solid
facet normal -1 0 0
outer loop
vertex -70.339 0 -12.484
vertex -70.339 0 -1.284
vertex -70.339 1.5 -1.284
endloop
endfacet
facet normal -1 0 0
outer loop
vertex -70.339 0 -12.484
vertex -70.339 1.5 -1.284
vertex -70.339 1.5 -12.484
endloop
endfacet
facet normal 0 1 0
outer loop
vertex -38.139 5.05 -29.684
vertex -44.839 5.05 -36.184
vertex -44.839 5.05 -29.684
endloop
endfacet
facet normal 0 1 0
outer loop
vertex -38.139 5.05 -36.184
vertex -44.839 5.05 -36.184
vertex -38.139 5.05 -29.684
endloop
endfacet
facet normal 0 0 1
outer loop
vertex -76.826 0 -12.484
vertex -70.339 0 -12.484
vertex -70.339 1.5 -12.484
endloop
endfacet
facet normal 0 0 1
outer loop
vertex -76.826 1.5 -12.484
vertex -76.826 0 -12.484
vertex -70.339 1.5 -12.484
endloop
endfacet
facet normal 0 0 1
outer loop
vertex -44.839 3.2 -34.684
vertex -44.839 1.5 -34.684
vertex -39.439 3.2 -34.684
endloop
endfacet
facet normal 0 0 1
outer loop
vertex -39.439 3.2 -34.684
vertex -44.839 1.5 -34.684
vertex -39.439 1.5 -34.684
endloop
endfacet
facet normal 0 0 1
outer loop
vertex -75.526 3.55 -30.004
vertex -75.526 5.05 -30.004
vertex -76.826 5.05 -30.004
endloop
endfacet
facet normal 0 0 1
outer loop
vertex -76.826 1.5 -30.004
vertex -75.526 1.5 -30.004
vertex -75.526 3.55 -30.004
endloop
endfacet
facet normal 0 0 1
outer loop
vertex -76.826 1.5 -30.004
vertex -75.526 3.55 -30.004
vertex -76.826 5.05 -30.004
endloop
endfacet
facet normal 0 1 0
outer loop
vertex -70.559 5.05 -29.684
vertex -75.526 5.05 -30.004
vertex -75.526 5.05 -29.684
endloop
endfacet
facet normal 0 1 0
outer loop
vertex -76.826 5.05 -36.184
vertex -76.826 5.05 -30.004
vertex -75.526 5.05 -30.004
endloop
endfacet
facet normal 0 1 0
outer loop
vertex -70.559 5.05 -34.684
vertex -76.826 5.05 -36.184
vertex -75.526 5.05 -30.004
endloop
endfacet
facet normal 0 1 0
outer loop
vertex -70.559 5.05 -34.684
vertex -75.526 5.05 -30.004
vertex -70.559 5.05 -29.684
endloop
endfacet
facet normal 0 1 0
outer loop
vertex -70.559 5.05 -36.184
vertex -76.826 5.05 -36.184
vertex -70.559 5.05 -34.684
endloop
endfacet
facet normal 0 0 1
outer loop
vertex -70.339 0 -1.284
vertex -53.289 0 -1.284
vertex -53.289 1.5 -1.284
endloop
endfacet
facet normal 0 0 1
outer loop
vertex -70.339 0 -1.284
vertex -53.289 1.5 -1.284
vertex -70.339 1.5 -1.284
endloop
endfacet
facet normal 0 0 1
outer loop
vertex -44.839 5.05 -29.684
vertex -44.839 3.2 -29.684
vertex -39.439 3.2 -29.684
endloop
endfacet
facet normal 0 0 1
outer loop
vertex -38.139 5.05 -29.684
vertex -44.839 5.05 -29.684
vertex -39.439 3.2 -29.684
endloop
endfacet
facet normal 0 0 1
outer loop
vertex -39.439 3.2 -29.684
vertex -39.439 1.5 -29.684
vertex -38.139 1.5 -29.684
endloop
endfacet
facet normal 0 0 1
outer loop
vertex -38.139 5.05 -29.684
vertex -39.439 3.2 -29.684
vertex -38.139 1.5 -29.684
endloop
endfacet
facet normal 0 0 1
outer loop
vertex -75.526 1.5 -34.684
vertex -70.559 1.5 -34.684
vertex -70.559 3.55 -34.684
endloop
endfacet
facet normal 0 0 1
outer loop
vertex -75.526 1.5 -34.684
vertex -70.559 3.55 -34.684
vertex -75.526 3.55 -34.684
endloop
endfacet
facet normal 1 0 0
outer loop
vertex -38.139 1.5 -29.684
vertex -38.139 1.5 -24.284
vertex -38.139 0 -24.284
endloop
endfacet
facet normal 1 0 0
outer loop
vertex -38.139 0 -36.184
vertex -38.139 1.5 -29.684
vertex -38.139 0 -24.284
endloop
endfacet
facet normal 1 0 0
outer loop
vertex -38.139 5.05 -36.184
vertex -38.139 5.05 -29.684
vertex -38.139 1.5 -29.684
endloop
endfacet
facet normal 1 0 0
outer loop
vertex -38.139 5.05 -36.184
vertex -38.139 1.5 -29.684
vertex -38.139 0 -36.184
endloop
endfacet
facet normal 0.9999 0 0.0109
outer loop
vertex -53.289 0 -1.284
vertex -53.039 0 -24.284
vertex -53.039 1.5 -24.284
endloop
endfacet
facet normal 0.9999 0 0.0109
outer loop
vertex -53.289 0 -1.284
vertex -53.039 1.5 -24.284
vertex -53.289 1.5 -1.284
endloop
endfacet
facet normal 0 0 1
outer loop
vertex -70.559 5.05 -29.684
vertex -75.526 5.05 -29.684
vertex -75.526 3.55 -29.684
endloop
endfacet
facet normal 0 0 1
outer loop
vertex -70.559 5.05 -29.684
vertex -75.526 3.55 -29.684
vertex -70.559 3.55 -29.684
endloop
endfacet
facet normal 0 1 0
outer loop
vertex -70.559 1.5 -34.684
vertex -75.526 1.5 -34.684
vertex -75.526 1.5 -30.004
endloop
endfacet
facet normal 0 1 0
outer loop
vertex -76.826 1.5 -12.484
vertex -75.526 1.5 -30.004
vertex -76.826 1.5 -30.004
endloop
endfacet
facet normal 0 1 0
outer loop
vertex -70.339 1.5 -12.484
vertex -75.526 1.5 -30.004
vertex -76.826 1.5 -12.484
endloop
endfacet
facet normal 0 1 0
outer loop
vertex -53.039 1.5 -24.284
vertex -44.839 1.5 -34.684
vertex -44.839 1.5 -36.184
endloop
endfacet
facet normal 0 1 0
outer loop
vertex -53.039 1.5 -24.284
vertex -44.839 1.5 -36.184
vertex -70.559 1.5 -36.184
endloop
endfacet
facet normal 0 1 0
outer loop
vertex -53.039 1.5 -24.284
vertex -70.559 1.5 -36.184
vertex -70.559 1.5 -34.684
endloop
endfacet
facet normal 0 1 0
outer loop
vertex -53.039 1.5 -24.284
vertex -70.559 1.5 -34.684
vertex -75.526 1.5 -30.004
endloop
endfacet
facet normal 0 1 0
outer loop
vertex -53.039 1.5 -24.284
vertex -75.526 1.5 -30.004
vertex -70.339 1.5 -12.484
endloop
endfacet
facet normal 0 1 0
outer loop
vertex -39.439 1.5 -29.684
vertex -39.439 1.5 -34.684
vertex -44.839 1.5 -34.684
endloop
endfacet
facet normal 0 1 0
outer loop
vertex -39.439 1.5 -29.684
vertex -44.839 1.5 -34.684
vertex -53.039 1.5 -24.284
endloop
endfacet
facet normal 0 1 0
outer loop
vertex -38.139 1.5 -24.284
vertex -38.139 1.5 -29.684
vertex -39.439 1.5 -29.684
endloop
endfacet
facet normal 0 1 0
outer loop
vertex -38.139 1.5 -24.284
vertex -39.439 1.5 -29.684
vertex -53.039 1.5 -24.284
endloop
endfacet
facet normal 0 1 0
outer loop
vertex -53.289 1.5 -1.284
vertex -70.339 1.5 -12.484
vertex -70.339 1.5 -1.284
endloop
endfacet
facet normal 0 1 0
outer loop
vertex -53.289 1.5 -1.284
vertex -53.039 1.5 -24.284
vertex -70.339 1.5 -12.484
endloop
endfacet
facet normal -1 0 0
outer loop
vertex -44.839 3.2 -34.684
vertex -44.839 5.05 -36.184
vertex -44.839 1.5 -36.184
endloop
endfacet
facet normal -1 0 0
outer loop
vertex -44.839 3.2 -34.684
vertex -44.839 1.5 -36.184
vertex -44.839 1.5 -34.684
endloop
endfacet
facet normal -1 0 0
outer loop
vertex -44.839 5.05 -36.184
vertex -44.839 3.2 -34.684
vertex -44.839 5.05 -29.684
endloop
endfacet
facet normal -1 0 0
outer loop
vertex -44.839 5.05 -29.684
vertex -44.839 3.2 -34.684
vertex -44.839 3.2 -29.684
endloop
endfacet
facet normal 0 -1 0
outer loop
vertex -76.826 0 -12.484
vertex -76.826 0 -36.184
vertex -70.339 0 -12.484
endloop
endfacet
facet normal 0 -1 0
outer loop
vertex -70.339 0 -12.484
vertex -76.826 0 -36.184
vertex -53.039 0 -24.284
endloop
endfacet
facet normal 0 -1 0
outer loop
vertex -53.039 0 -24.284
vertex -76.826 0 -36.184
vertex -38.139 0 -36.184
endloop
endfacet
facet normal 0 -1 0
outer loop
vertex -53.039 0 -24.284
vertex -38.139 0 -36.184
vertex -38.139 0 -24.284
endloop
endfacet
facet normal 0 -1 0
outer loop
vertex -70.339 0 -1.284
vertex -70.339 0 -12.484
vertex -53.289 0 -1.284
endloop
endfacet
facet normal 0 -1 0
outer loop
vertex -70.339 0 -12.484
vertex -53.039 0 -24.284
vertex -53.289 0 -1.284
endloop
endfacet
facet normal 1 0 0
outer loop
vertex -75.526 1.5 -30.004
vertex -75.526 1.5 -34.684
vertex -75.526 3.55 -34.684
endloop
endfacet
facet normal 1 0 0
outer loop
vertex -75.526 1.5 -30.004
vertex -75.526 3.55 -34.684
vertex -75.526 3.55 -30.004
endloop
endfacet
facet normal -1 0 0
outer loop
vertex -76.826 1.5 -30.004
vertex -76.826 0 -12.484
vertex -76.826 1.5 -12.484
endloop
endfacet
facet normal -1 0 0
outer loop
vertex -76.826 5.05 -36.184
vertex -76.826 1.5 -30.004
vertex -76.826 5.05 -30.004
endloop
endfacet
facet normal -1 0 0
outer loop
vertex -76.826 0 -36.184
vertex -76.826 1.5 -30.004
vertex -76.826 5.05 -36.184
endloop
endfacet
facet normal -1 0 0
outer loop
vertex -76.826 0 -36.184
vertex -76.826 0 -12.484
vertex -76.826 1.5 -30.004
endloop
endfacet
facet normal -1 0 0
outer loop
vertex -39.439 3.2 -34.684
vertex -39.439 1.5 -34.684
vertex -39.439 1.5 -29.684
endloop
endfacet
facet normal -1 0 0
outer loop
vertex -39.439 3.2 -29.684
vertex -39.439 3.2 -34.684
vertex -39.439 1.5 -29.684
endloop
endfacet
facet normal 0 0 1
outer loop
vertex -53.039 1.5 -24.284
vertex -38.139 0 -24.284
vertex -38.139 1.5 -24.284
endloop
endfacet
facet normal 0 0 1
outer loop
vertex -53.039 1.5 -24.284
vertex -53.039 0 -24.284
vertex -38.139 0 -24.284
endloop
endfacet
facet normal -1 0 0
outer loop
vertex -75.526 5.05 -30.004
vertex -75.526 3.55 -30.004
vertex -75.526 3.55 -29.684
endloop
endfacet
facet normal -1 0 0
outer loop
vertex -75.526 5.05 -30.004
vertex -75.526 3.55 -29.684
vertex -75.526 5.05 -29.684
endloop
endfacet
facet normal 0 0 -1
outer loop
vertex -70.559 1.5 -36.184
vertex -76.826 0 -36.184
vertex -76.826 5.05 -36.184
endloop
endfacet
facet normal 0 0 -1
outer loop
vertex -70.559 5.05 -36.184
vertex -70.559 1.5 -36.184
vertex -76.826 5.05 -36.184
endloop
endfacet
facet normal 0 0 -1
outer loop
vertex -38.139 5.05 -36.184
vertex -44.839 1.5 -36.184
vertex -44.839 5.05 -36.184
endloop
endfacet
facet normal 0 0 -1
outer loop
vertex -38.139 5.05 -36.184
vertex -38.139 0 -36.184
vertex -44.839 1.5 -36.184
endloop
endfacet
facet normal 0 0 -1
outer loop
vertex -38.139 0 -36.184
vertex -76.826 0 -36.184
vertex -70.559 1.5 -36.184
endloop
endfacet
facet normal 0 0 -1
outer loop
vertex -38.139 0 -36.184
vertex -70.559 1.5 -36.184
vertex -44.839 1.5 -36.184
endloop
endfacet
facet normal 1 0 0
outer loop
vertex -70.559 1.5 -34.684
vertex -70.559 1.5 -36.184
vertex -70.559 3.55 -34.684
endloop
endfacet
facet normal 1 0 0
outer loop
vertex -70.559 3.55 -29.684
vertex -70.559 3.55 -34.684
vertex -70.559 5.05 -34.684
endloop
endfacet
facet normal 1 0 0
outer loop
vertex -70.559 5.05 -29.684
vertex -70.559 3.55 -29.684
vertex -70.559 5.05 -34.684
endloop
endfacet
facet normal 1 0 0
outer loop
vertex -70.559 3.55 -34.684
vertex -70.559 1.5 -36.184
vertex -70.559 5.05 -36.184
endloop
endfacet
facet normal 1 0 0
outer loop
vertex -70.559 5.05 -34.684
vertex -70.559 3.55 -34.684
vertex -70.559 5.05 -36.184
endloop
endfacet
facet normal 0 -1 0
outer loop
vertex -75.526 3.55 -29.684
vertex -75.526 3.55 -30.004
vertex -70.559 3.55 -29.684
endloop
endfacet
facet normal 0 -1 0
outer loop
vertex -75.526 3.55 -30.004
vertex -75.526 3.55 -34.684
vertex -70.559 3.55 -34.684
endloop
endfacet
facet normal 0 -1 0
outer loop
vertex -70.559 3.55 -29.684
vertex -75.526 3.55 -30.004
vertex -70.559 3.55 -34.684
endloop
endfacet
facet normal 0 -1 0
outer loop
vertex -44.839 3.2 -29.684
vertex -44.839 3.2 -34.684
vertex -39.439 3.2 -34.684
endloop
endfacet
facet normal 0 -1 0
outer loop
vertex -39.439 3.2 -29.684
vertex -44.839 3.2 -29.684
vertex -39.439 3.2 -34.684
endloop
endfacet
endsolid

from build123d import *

# Parameters (mm, degrees)
BOSS_EXTRUDE1_DEPTH = 1.5
SKETCH2_W           = 35.686807758
SKETCH2_H           = 1.5
BOSS_EXTRUDE2_DEPTH = 1.5
SKETCH3_W           = 11.9
SKETCH3_H           = 1.5
BOSS_EXTRUDE3_DEPTH = 1.5
SKETCH4_W           = 23.7
SKETCH4_H           = 1.5
BOSS_EXTRUDE4_DEPTH = 1.5
BOSS_EXTRUDE5_DEPTH = 3.55
SKETCH6_W           = 4.966668371
SKETCH6_H           = 1.5
SKETCH6_W_2         = 5.4
SKETCH6_H_2         = 1.85
BOSS_EXTRUDE6_DEPTH = 5


with BuildPart() as part:
    # Sketch1 → Boss-Extrude1 (new body)
    with BuildSketch(Plane(origin=(0, 0, 0), x_dir=(1, 0, 0), z_dir=(0, 1, 0))):
        Polygon((-75.339050621, 34.683913692), (-39.639050621, 34.683913692), (-39.639050621, 24.283913692), (-53.039050621, 24.283913692), (-53.289050621, 1.283913692), (-70.339050621, 1.283913692), (-70.339050621, 12.483913692), (-75.339050621, 12.483913692), (-75.339050621, 24.283913692), align=None)
    extrude(amount=BOSS_EXTRUDE1_DEPTH)

    # Sketch2 → Boss-Extrude2 (add)
    with BuildSketch(Plane(origin=(0, 0, -34.683913692), x_dir=(-1, 0, 0), z_dir=(0, 0, -1))):
        with Locations((57.4824545, 0.75)):
            Rectangle(SKETCH2_W, SKETCH2_H)
    extrude(amount=BOSS_EXTRUDE2_DEPTH)

    # Sketch3 → Boss-Extrude3 (add)
    with BuildSketch(Plane(origin=(-39.639050621, 0, 0), x_dir=(0, 0, -1), z_dir=(1, 0, 0))):
        with Locations((30.233913692, 0.75)):
            Rectangle(SKETCH3_W, SKETCH3_H)
    extrude(amount=BOSS_EXTRUDE3_DEPTH)

    # Sketch4 → Boss-Extrude4 (add)
    with BuildSketch(Plane.ZY.offset(75.325858379)):
        with Locations((-24.333913692, 0.75)):
            Rectangle(SKETCH4_W, SKETCH4_H)
    extrude(amount=BOSS_EXTRUDE4_DEPTH)

    # Sketch5 → Boss-Extrude5 (add)
    with BuildSketch(Plane(origin=(0, 1.5, 0), x_dir=(1, 0, 0), z_dir=(0, 1, 0))):
        Polygon((-75.525858379, 34.683913692), (-75.525858379, 30.004194868), (-76.825858379, 30.004194868), (-76.825858379, 36.183913692), (-70.559190008, 36.183913692), (-70.559190008, 34.683913692), align=None)
        Polygon((-39.439050621, 34.683913692), (-39.439050621, 29.683913692), (-38.139050621, 29.683913692), (-38.139050621, 36.183913692), (-44.839050621, 36.183913692), (-44.839050621, 34.683913692), align=None)
    extrude(amount=BOSS_EXTRUDE5_DEPTH)

    # Sketch6 → Boss-Extrude6 (add)
    with BuildSketch(Plane.XY.offset(-34.683913692)):
        with Locations((-73.042524194, 4.3)):
            Rectangle(SKETCH6_W, SKETCH6_H)
        with Locations((-42.139050621, 4.125)):
            Rectangle(SKETCH6_W_2, SKETCH6_H_2)
    extrude(amount=BOSS_EXTRUDE6_DEPTH)


solid = part.part
